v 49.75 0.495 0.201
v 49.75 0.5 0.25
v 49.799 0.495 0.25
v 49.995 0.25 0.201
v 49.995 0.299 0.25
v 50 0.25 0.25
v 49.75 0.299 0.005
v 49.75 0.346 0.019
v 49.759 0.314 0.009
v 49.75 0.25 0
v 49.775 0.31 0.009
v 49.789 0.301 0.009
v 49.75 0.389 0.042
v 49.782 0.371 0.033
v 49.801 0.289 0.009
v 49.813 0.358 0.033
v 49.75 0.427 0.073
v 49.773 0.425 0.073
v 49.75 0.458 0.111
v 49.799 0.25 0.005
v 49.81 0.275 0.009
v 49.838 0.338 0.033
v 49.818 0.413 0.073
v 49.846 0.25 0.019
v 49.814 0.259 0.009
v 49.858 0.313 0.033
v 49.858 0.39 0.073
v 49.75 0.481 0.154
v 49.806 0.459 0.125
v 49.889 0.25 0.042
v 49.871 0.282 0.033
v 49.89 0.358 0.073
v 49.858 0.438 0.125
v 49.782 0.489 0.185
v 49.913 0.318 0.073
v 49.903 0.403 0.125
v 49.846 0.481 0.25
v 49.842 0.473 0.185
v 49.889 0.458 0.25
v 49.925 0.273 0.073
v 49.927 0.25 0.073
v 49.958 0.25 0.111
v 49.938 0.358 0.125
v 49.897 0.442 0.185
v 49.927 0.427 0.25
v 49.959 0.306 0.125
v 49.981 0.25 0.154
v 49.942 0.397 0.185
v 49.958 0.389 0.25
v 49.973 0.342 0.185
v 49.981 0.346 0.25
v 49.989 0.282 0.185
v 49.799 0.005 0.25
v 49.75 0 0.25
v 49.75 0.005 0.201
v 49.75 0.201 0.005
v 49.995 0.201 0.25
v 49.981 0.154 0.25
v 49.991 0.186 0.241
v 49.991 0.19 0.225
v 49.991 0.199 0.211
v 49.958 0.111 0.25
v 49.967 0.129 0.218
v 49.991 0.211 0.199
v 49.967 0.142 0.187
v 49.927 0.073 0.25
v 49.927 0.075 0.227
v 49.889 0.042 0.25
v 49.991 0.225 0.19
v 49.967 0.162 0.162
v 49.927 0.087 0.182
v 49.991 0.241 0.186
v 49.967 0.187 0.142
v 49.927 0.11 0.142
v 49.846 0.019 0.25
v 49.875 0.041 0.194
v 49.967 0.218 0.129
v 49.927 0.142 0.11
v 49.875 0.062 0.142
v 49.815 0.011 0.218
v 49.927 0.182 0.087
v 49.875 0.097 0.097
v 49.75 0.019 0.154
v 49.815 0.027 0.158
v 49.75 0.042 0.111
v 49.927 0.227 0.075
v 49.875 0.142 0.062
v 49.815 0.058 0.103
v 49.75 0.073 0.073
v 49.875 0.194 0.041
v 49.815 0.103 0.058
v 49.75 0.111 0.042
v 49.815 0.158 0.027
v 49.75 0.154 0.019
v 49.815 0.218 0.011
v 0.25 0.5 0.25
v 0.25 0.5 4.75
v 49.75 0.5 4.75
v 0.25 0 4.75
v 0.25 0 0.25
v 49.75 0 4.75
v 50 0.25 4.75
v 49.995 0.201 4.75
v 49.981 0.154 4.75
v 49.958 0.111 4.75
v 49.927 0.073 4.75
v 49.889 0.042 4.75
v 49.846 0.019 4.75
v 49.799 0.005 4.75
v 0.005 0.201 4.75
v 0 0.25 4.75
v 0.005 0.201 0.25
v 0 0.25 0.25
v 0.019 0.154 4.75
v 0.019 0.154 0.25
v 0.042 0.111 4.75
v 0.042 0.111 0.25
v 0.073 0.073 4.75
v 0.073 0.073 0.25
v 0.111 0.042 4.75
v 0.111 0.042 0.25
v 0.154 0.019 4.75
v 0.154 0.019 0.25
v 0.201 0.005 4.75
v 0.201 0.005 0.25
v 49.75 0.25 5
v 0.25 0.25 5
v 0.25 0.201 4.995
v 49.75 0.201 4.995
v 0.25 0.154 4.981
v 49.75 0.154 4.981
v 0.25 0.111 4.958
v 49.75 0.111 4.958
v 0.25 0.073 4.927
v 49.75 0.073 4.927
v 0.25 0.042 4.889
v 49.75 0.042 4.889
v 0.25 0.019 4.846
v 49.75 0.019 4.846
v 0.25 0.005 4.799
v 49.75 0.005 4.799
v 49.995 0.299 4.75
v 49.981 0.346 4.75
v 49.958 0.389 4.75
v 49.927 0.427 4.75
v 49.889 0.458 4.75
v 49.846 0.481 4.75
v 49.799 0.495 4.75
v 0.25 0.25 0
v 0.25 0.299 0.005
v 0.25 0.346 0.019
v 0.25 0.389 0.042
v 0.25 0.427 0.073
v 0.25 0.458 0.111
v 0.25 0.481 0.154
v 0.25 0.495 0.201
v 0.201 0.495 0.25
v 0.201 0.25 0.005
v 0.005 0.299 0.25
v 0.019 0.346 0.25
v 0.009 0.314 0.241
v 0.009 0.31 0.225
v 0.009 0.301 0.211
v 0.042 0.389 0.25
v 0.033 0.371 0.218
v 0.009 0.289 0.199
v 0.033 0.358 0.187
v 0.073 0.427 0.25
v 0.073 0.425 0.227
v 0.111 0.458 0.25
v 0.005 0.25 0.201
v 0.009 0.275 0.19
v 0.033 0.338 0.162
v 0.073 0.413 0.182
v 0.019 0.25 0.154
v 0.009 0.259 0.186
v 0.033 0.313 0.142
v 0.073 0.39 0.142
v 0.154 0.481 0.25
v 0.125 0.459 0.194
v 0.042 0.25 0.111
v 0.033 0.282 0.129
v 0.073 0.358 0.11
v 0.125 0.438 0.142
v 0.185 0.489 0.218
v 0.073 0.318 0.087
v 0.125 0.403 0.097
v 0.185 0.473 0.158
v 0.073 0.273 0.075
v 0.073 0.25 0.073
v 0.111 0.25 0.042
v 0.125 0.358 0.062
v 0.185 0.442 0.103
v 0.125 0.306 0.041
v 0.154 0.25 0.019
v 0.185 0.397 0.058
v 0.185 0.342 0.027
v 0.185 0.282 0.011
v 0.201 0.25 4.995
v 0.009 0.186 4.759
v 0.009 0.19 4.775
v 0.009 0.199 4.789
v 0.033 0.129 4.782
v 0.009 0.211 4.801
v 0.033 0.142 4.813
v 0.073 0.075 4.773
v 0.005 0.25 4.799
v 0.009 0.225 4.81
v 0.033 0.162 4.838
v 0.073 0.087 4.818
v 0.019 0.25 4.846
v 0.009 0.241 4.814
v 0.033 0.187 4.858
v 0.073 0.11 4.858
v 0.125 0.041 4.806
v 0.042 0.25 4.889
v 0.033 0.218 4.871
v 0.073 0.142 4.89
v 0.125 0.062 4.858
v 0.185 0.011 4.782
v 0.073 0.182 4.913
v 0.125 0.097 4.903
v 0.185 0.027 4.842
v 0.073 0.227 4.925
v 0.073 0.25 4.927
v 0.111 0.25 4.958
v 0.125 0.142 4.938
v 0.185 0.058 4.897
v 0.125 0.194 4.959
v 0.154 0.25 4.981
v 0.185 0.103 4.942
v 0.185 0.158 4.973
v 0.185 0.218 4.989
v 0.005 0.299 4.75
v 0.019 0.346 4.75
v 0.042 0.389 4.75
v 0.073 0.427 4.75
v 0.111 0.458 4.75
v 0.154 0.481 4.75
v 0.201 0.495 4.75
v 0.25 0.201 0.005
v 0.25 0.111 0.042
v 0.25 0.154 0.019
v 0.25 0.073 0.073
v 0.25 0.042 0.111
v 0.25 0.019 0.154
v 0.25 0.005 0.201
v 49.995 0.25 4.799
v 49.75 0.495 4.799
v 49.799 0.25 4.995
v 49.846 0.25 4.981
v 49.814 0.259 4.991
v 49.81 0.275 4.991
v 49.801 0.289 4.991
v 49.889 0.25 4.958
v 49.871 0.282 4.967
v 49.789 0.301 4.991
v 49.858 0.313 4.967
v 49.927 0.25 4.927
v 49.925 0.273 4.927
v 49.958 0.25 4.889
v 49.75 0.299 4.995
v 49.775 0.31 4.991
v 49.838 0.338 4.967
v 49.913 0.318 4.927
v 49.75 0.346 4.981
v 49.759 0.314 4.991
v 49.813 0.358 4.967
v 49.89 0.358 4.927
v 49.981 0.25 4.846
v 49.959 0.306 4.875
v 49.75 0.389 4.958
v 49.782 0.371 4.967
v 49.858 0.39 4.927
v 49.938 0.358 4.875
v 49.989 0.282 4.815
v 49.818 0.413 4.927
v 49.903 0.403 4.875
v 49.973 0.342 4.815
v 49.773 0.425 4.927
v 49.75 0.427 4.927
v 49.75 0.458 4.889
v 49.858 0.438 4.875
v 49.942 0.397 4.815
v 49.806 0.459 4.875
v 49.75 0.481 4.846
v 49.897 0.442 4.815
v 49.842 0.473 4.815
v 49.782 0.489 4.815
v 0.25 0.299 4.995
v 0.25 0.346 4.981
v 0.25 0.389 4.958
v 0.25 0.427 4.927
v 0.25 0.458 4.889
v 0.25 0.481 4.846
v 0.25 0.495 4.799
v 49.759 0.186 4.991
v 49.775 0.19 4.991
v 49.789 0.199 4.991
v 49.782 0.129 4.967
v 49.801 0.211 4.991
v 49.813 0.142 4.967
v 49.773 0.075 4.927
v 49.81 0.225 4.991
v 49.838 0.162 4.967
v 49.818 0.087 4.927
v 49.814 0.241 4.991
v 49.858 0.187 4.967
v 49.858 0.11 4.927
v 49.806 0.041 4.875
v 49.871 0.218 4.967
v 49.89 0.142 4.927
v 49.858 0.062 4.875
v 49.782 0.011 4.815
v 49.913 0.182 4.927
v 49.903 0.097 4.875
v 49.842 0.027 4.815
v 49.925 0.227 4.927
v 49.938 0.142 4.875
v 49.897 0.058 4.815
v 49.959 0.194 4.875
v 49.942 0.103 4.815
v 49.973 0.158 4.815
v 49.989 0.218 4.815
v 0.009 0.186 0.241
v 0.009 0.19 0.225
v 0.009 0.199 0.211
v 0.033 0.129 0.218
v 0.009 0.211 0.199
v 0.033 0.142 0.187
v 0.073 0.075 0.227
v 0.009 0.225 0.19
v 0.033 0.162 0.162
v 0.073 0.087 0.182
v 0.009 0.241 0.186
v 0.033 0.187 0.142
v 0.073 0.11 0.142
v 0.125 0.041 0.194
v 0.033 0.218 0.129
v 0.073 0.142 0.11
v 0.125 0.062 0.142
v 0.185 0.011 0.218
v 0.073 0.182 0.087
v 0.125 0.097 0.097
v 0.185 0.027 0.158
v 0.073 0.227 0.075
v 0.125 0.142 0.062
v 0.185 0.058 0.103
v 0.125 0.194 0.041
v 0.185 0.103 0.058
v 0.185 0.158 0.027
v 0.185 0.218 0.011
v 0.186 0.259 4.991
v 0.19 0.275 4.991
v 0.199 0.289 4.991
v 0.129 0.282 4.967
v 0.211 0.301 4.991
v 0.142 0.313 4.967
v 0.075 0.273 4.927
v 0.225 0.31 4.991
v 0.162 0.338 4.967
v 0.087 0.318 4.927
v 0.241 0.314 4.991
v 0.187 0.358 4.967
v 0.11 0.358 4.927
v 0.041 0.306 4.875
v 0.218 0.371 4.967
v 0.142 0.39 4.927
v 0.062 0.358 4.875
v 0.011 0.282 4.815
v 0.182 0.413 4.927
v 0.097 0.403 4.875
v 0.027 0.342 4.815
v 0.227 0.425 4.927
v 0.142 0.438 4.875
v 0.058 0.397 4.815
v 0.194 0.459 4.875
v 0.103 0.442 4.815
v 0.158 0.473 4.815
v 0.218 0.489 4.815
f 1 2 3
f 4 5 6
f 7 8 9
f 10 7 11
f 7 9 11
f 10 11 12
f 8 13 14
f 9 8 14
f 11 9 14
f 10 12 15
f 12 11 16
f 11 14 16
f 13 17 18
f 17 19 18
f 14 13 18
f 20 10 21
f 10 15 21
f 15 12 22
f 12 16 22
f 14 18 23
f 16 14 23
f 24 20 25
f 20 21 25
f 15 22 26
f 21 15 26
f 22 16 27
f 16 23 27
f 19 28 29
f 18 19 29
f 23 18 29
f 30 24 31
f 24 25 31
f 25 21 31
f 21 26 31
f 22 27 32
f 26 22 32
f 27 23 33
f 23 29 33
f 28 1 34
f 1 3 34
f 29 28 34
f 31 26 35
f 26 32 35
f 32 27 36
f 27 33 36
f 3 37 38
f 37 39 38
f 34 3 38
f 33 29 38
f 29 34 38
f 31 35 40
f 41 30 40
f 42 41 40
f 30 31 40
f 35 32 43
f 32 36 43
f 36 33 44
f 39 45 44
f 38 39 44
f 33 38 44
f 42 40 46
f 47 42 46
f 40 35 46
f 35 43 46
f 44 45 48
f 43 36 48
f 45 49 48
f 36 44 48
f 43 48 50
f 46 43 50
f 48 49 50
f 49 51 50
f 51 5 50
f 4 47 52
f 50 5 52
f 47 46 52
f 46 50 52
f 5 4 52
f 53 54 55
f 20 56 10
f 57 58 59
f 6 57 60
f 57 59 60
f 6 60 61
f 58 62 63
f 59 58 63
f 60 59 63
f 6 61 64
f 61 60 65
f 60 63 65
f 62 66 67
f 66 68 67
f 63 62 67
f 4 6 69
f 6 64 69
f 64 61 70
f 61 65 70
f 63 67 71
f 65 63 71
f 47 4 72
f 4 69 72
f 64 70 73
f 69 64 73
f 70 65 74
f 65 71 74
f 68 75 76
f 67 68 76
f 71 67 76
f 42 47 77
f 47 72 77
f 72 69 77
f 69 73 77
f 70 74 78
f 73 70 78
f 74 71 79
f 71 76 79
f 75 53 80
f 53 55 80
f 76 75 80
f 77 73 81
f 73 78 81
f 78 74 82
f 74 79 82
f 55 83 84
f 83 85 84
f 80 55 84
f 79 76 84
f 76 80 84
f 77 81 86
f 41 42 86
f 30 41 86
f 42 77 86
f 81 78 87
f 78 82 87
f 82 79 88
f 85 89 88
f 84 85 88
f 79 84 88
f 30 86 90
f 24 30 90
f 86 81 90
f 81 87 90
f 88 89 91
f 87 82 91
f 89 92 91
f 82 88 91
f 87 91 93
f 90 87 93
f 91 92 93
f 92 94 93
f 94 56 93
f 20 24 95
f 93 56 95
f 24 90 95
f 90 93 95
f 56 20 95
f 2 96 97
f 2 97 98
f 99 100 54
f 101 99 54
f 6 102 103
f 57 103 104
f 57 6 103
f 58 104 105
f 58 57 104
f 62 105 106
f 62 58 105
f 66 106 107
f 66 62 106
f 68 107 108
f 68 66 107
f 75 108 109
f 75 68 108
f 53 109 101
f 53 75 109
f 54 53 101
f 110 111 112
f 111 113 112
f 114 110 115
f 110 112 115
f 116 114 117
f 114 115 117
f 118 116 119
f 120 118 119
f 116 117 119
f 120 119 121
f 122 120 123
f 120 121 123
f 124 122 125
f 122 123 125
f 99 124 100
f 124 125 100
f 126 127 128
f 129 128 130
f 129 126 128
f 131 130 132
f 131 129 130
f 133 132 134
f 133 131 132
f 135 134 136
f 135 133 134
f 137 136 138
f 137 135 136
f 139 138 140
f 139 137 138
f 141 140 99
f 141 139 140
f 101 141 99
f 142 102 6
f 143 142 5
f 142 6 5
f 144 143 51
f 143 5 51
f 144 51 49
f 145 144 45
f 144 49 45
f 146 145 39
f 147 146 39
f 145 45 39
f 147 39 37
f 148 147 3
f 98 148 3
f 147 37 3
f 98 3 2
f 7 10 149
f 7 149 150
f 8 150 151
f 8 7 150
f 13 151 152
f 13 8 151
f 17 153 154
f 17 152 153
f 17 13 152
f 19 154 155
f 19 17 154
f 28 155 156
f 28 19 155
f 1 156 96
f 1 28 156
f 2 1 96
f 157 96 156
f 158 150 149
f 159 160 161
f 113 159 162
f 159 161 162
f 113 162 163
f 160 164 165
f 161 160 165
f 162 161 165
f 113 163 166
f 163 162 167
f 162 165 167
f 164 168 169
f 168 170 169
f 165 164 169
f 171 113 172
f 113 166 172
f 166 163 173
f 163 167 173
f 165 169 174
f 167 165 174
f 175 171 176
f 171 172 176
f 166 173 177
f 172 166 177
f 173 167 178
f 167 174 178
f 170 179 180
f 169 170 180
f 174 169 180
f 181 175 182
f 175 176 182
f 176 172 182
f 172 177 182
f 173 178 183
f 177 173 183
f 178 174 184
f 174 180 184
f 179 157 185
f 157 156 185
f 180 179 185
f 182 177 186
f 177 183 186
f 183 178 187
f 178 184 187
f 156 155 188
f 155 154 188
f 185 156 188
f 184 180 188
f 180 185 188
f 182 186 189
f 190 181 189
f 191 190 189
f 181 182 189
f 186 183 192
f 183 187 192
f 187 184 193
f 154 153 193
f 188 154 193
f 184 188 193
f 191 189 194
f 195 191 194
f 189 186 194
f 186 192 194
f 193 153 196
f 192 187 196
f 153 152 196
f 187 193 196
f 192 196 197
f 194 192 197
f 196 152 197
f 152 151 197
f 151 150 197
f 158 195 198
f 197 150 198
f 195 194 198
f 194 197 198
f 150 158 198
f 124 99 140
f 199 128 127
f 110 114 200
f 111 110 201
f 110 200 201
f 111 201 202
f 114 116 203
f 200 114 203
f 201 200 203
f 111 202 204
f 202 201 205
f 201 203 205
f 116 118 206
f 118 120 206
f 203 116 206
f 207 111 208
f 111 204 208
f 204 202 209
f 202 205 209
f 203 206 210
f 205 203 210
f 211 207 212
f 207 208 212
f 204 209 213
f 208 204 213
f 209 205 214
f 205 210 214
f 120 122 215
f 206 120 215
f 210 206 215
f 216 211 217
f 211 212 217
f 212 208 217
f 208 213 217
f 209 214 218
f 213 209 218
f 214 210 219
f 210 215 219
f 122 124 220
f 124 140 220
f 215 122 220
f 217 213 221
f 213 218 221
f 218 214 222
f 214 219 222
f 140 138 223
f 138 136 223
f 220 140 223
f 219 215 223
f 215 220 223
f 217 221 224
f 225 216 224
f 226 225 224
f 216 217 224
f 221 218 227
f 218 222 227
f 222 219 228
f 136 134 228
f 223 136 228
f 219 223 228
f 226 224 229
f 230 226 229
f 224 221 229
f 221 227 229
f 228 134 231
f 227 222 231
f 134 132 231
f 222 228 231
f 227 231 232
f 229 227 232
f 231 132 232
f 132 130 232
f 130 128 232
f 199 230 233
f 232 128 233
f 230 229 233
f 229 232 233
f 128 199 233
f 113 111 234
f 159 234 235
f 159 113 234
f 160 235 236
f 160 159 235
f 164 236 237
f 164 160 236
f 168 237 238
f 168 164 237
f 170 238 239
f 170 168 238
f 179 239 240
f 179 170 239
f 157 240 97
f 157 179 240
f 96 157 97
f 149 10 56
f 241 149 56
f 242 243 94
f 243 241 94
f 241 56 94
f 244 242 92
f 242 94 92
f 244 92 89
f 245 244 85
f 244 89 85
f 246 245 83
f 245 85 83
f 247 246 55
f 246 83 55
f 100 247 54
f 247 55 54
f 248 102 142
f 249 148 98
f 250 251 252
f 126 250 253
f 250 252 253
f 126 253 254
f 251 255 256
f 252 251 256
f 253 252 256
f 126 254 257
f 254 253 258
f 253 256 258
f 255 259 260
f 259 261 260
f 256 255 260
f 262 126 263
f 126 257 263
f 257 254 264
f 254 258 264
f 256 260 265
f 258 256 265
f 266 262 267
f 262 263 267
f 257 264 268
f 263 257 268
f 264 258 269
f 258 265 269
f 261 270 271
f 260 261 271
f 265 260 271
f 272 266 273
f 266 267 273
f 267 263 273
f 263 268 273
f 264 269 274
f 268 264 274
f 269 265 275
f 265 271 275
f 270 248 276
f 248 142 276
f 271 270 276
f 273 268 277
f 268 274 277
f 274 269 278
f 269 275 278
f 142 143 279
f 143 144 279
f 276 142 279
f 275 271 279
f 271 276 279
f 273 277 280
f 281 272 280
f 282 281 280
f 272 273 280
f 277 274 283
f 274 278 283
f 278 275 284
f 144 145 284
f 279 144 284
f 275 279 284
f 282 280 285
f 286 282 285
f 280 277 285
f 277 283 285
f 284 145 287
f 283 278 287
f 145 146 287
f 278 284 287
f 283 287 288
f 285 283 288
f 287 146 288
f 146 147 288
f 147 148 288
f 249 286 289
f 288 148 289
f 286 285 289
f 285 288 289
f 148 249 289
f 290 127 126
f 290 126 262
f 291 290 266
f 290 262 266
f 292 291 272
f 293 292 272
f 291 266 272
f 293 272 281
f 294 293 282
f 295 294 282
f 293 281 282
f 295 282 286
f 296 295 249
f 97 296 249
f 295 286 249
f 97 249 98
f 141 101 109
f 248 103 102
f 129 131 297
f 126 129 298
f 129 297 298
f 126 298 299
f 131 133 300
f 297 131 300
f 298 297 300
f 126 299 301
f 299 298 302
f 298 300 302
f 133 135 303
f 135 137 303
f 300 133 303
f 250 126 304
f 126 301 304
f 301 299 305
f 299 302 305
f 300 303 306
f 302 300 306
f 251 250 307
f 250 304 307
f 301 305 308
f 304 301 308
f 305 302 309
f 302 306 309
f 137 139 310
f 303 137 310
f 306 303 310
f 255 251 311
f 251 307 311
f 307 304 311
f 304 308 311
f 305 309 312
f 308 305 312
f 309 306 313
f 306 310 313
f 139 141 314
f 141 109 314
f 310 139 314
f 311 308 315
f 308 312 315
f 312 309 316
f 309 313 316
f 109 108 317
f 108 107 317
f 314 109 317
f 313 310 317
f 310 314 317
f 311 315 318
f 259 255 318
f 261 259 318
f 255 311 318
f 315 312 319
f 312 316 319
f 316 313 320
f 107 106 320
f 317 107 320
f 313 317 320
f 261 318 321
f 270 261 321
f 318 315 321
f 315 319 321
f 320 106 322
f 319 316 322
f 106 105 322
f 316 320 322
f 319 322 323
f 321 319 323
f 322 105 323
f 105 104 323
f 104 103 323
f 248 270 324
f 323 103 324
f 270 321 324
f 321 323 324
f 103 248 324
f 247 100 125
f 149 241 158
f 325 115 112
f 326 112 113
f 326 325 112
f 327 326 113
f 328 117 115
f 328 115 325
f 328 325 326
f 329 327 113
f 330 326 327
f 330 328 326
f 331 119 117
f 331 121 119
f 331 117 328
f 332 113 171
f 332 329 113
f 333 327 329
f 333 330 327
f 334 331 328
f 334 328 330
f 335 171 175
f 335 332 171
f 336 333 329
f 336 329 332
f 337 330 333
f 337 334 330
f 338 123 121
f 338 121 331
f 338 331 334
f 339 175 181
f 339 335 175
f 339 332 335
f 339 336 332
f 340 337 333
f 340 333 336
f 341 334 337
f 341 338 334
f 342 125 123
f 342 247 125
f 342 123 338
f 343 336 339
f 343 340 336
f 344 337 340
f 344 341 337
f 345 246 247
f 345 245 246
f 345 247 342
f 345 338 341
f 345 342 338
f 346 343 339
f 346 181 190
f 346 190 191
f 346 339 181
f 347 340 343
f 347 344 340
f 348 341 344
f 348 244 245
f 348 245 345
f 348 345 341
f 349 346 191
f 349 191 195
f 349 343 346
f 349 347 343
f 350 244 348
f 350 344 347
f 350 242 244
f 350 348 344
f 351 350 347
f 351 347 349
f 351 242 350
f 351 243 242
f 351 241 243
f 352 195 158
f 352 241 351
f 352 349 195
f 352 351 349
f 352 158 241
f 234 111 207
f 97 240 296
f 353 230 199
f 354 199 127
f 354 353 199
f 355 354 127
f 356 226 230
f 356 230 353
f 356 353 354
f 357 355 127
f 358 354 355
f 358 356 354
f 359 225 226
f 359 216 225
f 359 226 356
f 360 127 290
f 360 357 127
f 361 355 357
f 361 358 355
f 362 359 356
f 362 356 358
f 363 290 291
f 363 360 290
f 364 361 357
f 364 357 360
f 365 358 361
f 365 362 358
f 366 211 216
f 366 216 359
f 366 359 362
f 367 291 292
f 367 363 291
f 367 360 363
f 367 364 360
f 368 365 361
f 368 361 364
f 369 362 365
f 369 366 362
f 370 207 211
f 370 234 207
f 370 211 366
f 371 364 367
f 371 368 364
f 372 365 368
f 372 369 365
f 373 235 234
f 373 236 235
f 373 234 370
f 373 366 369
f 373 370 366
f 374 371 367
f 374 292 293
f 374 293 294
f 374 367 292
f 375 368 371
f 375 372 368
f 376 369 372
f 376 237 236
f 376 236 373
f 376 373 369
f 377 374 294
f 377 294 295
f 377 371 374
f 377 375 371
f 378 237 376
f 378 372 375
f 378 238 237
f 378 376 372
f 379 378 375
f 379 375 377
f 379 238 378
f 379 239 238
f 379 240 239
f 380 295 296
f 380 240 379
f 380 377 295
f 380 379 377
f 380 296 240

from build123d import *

# Parameters (mm, degrees)
SKETCH1_W           = 50
SKETCH1_H           = 5
BOSS_EXTRUDE1_DEPTH = 0.5
FILLET3_R           = 0.25


with BuildPart() as part:
    # Sketch1 → Boss-Extrude1 (new body)
    with BuildSketch(Plane(origin=(0, 0, 0), x_dir=(1, 0, 0), z_dir=(0, 1, 0))):
        with Locations((25, -2.5)):
            Rectangle(SKETCH1_W, SKETCH1_H)
    extrude(amount=BOSS_EXTRUDE1_DEPTH)

    # Fillet3
    fillet3_edges = [part.edges().sort_by_distance(p)[0] for p in [
        (50, 0.5, 2.5),
        (25, 0.5, 0),
        (0, 0.5, 2.5),
        (25, 0, 0),
        (50, 0, 2.5),
        (25, 0, 5),
        (0, 0, 2.5),
        (0, 0.25, 0),
        (50, 0.25, 0),
        (50, 0.25, 5),
        (0, 0.25, 5),
        (25, 0.5, 5),
    ]]
    fillet(fillet3_edges, radius=FILLET3_R - 0.0001)  # a hair under: the kernel refuses the full size


solid = part.part
